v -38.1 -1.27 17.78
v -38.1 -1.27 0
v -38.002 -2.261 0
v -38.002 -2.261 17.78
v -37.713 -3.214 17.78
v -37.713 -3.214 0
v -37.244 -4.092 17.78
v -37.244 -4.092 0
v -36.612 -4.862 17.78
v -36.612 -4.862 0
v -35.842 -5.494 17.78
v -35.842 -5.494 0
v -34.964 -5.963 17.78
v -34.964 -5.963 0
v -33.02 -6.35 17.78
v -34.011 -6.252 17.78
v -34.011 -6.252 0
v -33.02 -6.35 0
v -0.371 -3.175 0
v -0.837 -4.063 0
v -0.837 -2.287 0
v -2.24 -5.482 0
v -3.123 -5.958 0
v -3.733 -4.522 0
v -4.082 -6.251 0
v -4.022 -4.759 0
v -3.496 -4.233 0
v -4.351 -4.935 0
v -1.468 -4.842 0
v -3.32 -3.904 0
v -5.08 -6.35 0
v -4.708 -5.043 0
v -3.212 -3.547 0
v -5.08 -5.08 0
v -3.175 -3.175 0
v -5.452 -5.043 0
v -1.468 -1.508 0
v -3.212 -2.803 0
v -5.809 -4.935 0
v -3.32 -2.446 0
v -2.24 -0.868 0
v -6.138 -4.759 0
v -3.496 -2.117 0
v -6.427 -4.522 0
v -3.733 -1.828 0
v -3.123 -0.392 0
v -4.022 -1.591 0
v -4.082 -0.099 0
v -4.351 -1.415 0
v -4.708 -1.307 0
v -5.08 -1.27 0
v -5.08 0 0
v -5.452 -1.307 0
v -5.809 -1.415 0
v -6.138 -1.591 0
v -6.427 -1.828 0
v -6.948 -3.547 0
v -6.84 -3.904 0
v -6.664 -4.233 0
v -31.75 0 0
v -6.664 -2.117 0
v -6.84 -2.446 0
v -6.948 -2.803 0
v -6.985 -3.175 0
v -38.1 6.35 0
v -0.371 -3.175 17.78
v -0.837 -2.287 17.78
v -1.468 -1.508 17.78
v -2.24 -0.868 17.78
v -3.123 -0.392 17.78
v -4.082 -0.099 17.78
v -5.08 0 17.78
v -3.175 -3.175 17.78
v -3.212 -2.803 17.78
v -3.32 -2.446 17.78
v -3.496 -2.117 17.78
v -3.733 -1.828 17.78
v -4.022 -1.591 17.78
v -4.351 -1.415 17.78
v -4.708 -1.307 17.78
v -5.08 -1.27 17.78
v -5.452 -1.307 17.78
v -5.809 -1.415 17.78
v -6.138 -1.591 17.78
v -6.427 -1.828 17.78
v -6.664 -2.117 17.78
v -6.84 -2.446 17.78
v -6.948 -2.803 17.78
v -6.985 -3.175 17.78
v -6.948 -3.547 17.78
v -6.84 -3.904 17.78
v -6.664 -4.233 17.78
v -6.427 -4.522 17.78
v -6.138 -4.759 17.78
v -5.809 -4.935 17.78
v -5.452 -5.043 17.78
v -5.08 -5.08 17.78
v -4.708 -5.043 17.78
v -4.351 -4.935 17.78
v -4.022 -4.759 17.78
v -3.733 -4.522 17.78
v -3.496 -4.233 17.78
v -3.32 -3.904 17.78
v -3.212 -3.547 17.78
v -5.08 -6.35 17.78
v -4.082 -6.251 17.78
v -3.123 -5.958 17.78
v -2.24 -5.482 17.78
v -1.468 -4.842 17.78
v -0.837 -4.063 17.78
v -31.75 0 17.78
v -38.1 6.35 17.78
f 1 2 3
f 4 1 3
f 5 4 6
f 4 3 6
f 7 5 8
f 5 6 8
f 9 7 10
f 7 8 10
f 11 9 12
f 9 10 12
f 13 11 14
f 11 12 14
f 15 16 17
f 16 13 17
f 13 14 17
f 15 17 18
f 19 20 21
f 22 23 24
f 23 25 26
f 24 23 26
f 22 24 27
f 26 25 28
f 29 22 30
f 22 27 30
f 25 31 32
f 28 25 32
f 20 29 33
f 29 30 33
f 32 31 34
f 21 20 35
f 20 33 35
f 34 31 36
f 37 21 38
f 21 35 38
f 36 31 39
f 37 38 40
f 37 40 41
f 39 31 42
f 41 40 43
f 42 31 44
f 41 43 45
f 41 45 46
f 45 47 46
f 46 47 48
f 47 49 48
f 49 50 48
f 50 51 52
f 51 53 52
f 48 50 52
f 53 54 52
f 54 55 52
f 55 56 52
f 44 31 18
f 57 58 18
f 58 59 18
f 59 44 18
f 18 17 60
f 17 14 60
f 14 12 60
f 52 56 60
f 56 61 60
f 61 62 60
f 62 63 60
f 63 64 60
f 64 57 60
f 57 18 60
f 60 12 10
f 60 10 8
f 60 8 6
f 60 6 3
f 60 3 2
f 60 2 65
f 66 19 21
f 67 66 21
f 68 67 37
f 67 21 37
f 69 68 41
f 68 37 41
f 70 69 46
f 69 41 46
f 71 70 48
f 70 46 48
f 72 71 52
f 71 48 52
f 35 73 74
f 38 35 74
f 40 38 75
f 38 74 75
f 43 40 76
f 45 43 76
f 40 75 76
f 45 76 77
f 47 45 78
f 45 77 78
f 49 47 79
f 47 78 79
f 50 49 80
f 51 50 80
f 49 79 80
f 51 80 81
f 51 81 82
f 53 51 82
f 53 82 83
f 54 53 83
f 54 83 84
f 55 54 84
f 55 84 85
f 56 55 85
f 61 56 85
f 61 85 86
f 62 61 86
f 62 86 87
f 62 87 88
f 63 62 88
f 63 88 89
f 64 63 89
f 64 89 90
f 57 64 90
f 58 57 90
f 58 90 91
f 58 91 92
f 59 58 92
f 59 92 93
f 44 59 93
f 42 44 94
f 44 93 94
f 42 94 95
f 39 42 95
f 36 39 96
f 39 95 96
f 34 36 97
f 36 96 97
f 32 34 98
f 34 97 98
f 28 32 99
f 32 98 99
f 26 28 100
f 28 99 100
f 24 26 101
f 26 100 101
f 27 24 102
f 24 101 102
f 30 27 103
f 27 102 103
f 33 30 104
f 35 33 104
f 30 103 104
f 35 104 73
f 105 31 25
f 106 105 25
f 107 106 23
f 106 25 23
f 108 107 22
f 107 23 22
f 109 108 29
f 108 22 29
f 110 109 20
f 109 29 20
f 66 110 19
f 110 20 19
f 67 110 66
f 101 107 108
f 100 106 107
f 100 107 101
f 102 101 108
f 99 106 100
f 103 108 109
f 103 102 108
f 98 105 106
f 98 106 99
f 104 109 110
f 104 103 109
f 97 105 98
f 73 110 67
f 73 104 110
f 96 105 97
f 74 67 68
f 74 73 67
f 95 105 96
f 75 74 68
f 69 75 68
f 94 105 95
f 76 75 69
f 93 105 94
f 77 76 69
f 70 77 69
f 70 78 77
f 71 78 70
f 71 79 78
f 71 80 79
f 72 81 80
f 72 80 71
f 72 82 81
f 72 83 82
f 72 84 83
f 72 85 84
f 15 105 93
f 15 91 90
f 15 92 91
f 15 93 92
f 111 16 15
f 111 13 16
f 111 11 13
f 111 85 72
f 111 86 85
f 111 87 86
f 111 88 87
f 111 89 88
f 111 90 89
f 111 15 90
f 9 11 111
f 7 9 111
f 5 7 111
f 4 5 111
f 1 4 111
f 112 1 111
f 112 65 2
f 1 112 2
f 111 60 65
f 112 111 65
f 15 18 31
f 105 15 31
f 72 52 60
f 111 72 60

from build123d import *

# Parameters (mm, degrees)
BOSS_EXTRUDE1_DEPTH = 17.78
FILLET2_R           = 5.08
SKETCH3_R           = 1.905
CUT_EXTRUDE1_DEPTH  = 43.521299369


with BuildPart() as part:
    # Sketch1 → Boss-Extrude1 (new body)
    with BuildSketch(Plane(origin=(0, 0, 0), x_dir=(0, 1, 0), z_dir=(0, 0, 1))):
        Polygon((0, 0), (0, 31.75), (6.35, 38.1), (-6.35, 38.1), (-6.35, 0), align=None)
    extrude(amount=BOSS_EXTRUDE1_DEPTH)

    # Fillet2
    # the kernel refuses this fillet: 5.08 mm, written as the material it takes off along each edge
    with BuildSketch(Plane(origin=(-38.1, -6.35, -12.7), x_dir=(0, 1, 0), z_dir=(0, 0, 1)), Plane(origin=(0, -6.35, -12.7), x_dir=(-1, 0, 0), z_dir=(0, 0, 1))) as fillet2_piece_1:
        with BuildLine():
            CenterArc((FILLET2_R, -FILLET2_R), FILLET2_R, 90, 90)
            Line((0, -FILLET2_R), (0, 0))
            Line((0, 0), (FILLET2_R, 0))
        make_face()
    extrude(amount=43.18, mode=Mode.SUBTRACT)
    with BuildSketch(Plane(origin=(0, 0, -12.7), x_dir=(-1, 0, 0), z_dir=(0, 0, 1))) as fillet2_piece_2:
        with BuildLine():
            CenterArc((FILLET2_R, FILLET2_R), FILLET2_R, 180, 90)
            Line((0, FILLET2_R), (0, 0))
            Line((0, 0), (FILLET2_R, 0))
        make_face()
    extrude(amount=43.18, mode=Mode.SUBTRACT)

    # Sketch3 → Cut-Extrude1 (cut, through all)
    with BuildSketch(Plane.XY.offset(17.78)):
        with Locations((-5.08, -3.175)):
            Circle(SKETCH3_R)
    extrude(amount=-CUT_EXTRUDE1_DEPTH, mode=Mode.SUBTRACT)


solid = part.part
